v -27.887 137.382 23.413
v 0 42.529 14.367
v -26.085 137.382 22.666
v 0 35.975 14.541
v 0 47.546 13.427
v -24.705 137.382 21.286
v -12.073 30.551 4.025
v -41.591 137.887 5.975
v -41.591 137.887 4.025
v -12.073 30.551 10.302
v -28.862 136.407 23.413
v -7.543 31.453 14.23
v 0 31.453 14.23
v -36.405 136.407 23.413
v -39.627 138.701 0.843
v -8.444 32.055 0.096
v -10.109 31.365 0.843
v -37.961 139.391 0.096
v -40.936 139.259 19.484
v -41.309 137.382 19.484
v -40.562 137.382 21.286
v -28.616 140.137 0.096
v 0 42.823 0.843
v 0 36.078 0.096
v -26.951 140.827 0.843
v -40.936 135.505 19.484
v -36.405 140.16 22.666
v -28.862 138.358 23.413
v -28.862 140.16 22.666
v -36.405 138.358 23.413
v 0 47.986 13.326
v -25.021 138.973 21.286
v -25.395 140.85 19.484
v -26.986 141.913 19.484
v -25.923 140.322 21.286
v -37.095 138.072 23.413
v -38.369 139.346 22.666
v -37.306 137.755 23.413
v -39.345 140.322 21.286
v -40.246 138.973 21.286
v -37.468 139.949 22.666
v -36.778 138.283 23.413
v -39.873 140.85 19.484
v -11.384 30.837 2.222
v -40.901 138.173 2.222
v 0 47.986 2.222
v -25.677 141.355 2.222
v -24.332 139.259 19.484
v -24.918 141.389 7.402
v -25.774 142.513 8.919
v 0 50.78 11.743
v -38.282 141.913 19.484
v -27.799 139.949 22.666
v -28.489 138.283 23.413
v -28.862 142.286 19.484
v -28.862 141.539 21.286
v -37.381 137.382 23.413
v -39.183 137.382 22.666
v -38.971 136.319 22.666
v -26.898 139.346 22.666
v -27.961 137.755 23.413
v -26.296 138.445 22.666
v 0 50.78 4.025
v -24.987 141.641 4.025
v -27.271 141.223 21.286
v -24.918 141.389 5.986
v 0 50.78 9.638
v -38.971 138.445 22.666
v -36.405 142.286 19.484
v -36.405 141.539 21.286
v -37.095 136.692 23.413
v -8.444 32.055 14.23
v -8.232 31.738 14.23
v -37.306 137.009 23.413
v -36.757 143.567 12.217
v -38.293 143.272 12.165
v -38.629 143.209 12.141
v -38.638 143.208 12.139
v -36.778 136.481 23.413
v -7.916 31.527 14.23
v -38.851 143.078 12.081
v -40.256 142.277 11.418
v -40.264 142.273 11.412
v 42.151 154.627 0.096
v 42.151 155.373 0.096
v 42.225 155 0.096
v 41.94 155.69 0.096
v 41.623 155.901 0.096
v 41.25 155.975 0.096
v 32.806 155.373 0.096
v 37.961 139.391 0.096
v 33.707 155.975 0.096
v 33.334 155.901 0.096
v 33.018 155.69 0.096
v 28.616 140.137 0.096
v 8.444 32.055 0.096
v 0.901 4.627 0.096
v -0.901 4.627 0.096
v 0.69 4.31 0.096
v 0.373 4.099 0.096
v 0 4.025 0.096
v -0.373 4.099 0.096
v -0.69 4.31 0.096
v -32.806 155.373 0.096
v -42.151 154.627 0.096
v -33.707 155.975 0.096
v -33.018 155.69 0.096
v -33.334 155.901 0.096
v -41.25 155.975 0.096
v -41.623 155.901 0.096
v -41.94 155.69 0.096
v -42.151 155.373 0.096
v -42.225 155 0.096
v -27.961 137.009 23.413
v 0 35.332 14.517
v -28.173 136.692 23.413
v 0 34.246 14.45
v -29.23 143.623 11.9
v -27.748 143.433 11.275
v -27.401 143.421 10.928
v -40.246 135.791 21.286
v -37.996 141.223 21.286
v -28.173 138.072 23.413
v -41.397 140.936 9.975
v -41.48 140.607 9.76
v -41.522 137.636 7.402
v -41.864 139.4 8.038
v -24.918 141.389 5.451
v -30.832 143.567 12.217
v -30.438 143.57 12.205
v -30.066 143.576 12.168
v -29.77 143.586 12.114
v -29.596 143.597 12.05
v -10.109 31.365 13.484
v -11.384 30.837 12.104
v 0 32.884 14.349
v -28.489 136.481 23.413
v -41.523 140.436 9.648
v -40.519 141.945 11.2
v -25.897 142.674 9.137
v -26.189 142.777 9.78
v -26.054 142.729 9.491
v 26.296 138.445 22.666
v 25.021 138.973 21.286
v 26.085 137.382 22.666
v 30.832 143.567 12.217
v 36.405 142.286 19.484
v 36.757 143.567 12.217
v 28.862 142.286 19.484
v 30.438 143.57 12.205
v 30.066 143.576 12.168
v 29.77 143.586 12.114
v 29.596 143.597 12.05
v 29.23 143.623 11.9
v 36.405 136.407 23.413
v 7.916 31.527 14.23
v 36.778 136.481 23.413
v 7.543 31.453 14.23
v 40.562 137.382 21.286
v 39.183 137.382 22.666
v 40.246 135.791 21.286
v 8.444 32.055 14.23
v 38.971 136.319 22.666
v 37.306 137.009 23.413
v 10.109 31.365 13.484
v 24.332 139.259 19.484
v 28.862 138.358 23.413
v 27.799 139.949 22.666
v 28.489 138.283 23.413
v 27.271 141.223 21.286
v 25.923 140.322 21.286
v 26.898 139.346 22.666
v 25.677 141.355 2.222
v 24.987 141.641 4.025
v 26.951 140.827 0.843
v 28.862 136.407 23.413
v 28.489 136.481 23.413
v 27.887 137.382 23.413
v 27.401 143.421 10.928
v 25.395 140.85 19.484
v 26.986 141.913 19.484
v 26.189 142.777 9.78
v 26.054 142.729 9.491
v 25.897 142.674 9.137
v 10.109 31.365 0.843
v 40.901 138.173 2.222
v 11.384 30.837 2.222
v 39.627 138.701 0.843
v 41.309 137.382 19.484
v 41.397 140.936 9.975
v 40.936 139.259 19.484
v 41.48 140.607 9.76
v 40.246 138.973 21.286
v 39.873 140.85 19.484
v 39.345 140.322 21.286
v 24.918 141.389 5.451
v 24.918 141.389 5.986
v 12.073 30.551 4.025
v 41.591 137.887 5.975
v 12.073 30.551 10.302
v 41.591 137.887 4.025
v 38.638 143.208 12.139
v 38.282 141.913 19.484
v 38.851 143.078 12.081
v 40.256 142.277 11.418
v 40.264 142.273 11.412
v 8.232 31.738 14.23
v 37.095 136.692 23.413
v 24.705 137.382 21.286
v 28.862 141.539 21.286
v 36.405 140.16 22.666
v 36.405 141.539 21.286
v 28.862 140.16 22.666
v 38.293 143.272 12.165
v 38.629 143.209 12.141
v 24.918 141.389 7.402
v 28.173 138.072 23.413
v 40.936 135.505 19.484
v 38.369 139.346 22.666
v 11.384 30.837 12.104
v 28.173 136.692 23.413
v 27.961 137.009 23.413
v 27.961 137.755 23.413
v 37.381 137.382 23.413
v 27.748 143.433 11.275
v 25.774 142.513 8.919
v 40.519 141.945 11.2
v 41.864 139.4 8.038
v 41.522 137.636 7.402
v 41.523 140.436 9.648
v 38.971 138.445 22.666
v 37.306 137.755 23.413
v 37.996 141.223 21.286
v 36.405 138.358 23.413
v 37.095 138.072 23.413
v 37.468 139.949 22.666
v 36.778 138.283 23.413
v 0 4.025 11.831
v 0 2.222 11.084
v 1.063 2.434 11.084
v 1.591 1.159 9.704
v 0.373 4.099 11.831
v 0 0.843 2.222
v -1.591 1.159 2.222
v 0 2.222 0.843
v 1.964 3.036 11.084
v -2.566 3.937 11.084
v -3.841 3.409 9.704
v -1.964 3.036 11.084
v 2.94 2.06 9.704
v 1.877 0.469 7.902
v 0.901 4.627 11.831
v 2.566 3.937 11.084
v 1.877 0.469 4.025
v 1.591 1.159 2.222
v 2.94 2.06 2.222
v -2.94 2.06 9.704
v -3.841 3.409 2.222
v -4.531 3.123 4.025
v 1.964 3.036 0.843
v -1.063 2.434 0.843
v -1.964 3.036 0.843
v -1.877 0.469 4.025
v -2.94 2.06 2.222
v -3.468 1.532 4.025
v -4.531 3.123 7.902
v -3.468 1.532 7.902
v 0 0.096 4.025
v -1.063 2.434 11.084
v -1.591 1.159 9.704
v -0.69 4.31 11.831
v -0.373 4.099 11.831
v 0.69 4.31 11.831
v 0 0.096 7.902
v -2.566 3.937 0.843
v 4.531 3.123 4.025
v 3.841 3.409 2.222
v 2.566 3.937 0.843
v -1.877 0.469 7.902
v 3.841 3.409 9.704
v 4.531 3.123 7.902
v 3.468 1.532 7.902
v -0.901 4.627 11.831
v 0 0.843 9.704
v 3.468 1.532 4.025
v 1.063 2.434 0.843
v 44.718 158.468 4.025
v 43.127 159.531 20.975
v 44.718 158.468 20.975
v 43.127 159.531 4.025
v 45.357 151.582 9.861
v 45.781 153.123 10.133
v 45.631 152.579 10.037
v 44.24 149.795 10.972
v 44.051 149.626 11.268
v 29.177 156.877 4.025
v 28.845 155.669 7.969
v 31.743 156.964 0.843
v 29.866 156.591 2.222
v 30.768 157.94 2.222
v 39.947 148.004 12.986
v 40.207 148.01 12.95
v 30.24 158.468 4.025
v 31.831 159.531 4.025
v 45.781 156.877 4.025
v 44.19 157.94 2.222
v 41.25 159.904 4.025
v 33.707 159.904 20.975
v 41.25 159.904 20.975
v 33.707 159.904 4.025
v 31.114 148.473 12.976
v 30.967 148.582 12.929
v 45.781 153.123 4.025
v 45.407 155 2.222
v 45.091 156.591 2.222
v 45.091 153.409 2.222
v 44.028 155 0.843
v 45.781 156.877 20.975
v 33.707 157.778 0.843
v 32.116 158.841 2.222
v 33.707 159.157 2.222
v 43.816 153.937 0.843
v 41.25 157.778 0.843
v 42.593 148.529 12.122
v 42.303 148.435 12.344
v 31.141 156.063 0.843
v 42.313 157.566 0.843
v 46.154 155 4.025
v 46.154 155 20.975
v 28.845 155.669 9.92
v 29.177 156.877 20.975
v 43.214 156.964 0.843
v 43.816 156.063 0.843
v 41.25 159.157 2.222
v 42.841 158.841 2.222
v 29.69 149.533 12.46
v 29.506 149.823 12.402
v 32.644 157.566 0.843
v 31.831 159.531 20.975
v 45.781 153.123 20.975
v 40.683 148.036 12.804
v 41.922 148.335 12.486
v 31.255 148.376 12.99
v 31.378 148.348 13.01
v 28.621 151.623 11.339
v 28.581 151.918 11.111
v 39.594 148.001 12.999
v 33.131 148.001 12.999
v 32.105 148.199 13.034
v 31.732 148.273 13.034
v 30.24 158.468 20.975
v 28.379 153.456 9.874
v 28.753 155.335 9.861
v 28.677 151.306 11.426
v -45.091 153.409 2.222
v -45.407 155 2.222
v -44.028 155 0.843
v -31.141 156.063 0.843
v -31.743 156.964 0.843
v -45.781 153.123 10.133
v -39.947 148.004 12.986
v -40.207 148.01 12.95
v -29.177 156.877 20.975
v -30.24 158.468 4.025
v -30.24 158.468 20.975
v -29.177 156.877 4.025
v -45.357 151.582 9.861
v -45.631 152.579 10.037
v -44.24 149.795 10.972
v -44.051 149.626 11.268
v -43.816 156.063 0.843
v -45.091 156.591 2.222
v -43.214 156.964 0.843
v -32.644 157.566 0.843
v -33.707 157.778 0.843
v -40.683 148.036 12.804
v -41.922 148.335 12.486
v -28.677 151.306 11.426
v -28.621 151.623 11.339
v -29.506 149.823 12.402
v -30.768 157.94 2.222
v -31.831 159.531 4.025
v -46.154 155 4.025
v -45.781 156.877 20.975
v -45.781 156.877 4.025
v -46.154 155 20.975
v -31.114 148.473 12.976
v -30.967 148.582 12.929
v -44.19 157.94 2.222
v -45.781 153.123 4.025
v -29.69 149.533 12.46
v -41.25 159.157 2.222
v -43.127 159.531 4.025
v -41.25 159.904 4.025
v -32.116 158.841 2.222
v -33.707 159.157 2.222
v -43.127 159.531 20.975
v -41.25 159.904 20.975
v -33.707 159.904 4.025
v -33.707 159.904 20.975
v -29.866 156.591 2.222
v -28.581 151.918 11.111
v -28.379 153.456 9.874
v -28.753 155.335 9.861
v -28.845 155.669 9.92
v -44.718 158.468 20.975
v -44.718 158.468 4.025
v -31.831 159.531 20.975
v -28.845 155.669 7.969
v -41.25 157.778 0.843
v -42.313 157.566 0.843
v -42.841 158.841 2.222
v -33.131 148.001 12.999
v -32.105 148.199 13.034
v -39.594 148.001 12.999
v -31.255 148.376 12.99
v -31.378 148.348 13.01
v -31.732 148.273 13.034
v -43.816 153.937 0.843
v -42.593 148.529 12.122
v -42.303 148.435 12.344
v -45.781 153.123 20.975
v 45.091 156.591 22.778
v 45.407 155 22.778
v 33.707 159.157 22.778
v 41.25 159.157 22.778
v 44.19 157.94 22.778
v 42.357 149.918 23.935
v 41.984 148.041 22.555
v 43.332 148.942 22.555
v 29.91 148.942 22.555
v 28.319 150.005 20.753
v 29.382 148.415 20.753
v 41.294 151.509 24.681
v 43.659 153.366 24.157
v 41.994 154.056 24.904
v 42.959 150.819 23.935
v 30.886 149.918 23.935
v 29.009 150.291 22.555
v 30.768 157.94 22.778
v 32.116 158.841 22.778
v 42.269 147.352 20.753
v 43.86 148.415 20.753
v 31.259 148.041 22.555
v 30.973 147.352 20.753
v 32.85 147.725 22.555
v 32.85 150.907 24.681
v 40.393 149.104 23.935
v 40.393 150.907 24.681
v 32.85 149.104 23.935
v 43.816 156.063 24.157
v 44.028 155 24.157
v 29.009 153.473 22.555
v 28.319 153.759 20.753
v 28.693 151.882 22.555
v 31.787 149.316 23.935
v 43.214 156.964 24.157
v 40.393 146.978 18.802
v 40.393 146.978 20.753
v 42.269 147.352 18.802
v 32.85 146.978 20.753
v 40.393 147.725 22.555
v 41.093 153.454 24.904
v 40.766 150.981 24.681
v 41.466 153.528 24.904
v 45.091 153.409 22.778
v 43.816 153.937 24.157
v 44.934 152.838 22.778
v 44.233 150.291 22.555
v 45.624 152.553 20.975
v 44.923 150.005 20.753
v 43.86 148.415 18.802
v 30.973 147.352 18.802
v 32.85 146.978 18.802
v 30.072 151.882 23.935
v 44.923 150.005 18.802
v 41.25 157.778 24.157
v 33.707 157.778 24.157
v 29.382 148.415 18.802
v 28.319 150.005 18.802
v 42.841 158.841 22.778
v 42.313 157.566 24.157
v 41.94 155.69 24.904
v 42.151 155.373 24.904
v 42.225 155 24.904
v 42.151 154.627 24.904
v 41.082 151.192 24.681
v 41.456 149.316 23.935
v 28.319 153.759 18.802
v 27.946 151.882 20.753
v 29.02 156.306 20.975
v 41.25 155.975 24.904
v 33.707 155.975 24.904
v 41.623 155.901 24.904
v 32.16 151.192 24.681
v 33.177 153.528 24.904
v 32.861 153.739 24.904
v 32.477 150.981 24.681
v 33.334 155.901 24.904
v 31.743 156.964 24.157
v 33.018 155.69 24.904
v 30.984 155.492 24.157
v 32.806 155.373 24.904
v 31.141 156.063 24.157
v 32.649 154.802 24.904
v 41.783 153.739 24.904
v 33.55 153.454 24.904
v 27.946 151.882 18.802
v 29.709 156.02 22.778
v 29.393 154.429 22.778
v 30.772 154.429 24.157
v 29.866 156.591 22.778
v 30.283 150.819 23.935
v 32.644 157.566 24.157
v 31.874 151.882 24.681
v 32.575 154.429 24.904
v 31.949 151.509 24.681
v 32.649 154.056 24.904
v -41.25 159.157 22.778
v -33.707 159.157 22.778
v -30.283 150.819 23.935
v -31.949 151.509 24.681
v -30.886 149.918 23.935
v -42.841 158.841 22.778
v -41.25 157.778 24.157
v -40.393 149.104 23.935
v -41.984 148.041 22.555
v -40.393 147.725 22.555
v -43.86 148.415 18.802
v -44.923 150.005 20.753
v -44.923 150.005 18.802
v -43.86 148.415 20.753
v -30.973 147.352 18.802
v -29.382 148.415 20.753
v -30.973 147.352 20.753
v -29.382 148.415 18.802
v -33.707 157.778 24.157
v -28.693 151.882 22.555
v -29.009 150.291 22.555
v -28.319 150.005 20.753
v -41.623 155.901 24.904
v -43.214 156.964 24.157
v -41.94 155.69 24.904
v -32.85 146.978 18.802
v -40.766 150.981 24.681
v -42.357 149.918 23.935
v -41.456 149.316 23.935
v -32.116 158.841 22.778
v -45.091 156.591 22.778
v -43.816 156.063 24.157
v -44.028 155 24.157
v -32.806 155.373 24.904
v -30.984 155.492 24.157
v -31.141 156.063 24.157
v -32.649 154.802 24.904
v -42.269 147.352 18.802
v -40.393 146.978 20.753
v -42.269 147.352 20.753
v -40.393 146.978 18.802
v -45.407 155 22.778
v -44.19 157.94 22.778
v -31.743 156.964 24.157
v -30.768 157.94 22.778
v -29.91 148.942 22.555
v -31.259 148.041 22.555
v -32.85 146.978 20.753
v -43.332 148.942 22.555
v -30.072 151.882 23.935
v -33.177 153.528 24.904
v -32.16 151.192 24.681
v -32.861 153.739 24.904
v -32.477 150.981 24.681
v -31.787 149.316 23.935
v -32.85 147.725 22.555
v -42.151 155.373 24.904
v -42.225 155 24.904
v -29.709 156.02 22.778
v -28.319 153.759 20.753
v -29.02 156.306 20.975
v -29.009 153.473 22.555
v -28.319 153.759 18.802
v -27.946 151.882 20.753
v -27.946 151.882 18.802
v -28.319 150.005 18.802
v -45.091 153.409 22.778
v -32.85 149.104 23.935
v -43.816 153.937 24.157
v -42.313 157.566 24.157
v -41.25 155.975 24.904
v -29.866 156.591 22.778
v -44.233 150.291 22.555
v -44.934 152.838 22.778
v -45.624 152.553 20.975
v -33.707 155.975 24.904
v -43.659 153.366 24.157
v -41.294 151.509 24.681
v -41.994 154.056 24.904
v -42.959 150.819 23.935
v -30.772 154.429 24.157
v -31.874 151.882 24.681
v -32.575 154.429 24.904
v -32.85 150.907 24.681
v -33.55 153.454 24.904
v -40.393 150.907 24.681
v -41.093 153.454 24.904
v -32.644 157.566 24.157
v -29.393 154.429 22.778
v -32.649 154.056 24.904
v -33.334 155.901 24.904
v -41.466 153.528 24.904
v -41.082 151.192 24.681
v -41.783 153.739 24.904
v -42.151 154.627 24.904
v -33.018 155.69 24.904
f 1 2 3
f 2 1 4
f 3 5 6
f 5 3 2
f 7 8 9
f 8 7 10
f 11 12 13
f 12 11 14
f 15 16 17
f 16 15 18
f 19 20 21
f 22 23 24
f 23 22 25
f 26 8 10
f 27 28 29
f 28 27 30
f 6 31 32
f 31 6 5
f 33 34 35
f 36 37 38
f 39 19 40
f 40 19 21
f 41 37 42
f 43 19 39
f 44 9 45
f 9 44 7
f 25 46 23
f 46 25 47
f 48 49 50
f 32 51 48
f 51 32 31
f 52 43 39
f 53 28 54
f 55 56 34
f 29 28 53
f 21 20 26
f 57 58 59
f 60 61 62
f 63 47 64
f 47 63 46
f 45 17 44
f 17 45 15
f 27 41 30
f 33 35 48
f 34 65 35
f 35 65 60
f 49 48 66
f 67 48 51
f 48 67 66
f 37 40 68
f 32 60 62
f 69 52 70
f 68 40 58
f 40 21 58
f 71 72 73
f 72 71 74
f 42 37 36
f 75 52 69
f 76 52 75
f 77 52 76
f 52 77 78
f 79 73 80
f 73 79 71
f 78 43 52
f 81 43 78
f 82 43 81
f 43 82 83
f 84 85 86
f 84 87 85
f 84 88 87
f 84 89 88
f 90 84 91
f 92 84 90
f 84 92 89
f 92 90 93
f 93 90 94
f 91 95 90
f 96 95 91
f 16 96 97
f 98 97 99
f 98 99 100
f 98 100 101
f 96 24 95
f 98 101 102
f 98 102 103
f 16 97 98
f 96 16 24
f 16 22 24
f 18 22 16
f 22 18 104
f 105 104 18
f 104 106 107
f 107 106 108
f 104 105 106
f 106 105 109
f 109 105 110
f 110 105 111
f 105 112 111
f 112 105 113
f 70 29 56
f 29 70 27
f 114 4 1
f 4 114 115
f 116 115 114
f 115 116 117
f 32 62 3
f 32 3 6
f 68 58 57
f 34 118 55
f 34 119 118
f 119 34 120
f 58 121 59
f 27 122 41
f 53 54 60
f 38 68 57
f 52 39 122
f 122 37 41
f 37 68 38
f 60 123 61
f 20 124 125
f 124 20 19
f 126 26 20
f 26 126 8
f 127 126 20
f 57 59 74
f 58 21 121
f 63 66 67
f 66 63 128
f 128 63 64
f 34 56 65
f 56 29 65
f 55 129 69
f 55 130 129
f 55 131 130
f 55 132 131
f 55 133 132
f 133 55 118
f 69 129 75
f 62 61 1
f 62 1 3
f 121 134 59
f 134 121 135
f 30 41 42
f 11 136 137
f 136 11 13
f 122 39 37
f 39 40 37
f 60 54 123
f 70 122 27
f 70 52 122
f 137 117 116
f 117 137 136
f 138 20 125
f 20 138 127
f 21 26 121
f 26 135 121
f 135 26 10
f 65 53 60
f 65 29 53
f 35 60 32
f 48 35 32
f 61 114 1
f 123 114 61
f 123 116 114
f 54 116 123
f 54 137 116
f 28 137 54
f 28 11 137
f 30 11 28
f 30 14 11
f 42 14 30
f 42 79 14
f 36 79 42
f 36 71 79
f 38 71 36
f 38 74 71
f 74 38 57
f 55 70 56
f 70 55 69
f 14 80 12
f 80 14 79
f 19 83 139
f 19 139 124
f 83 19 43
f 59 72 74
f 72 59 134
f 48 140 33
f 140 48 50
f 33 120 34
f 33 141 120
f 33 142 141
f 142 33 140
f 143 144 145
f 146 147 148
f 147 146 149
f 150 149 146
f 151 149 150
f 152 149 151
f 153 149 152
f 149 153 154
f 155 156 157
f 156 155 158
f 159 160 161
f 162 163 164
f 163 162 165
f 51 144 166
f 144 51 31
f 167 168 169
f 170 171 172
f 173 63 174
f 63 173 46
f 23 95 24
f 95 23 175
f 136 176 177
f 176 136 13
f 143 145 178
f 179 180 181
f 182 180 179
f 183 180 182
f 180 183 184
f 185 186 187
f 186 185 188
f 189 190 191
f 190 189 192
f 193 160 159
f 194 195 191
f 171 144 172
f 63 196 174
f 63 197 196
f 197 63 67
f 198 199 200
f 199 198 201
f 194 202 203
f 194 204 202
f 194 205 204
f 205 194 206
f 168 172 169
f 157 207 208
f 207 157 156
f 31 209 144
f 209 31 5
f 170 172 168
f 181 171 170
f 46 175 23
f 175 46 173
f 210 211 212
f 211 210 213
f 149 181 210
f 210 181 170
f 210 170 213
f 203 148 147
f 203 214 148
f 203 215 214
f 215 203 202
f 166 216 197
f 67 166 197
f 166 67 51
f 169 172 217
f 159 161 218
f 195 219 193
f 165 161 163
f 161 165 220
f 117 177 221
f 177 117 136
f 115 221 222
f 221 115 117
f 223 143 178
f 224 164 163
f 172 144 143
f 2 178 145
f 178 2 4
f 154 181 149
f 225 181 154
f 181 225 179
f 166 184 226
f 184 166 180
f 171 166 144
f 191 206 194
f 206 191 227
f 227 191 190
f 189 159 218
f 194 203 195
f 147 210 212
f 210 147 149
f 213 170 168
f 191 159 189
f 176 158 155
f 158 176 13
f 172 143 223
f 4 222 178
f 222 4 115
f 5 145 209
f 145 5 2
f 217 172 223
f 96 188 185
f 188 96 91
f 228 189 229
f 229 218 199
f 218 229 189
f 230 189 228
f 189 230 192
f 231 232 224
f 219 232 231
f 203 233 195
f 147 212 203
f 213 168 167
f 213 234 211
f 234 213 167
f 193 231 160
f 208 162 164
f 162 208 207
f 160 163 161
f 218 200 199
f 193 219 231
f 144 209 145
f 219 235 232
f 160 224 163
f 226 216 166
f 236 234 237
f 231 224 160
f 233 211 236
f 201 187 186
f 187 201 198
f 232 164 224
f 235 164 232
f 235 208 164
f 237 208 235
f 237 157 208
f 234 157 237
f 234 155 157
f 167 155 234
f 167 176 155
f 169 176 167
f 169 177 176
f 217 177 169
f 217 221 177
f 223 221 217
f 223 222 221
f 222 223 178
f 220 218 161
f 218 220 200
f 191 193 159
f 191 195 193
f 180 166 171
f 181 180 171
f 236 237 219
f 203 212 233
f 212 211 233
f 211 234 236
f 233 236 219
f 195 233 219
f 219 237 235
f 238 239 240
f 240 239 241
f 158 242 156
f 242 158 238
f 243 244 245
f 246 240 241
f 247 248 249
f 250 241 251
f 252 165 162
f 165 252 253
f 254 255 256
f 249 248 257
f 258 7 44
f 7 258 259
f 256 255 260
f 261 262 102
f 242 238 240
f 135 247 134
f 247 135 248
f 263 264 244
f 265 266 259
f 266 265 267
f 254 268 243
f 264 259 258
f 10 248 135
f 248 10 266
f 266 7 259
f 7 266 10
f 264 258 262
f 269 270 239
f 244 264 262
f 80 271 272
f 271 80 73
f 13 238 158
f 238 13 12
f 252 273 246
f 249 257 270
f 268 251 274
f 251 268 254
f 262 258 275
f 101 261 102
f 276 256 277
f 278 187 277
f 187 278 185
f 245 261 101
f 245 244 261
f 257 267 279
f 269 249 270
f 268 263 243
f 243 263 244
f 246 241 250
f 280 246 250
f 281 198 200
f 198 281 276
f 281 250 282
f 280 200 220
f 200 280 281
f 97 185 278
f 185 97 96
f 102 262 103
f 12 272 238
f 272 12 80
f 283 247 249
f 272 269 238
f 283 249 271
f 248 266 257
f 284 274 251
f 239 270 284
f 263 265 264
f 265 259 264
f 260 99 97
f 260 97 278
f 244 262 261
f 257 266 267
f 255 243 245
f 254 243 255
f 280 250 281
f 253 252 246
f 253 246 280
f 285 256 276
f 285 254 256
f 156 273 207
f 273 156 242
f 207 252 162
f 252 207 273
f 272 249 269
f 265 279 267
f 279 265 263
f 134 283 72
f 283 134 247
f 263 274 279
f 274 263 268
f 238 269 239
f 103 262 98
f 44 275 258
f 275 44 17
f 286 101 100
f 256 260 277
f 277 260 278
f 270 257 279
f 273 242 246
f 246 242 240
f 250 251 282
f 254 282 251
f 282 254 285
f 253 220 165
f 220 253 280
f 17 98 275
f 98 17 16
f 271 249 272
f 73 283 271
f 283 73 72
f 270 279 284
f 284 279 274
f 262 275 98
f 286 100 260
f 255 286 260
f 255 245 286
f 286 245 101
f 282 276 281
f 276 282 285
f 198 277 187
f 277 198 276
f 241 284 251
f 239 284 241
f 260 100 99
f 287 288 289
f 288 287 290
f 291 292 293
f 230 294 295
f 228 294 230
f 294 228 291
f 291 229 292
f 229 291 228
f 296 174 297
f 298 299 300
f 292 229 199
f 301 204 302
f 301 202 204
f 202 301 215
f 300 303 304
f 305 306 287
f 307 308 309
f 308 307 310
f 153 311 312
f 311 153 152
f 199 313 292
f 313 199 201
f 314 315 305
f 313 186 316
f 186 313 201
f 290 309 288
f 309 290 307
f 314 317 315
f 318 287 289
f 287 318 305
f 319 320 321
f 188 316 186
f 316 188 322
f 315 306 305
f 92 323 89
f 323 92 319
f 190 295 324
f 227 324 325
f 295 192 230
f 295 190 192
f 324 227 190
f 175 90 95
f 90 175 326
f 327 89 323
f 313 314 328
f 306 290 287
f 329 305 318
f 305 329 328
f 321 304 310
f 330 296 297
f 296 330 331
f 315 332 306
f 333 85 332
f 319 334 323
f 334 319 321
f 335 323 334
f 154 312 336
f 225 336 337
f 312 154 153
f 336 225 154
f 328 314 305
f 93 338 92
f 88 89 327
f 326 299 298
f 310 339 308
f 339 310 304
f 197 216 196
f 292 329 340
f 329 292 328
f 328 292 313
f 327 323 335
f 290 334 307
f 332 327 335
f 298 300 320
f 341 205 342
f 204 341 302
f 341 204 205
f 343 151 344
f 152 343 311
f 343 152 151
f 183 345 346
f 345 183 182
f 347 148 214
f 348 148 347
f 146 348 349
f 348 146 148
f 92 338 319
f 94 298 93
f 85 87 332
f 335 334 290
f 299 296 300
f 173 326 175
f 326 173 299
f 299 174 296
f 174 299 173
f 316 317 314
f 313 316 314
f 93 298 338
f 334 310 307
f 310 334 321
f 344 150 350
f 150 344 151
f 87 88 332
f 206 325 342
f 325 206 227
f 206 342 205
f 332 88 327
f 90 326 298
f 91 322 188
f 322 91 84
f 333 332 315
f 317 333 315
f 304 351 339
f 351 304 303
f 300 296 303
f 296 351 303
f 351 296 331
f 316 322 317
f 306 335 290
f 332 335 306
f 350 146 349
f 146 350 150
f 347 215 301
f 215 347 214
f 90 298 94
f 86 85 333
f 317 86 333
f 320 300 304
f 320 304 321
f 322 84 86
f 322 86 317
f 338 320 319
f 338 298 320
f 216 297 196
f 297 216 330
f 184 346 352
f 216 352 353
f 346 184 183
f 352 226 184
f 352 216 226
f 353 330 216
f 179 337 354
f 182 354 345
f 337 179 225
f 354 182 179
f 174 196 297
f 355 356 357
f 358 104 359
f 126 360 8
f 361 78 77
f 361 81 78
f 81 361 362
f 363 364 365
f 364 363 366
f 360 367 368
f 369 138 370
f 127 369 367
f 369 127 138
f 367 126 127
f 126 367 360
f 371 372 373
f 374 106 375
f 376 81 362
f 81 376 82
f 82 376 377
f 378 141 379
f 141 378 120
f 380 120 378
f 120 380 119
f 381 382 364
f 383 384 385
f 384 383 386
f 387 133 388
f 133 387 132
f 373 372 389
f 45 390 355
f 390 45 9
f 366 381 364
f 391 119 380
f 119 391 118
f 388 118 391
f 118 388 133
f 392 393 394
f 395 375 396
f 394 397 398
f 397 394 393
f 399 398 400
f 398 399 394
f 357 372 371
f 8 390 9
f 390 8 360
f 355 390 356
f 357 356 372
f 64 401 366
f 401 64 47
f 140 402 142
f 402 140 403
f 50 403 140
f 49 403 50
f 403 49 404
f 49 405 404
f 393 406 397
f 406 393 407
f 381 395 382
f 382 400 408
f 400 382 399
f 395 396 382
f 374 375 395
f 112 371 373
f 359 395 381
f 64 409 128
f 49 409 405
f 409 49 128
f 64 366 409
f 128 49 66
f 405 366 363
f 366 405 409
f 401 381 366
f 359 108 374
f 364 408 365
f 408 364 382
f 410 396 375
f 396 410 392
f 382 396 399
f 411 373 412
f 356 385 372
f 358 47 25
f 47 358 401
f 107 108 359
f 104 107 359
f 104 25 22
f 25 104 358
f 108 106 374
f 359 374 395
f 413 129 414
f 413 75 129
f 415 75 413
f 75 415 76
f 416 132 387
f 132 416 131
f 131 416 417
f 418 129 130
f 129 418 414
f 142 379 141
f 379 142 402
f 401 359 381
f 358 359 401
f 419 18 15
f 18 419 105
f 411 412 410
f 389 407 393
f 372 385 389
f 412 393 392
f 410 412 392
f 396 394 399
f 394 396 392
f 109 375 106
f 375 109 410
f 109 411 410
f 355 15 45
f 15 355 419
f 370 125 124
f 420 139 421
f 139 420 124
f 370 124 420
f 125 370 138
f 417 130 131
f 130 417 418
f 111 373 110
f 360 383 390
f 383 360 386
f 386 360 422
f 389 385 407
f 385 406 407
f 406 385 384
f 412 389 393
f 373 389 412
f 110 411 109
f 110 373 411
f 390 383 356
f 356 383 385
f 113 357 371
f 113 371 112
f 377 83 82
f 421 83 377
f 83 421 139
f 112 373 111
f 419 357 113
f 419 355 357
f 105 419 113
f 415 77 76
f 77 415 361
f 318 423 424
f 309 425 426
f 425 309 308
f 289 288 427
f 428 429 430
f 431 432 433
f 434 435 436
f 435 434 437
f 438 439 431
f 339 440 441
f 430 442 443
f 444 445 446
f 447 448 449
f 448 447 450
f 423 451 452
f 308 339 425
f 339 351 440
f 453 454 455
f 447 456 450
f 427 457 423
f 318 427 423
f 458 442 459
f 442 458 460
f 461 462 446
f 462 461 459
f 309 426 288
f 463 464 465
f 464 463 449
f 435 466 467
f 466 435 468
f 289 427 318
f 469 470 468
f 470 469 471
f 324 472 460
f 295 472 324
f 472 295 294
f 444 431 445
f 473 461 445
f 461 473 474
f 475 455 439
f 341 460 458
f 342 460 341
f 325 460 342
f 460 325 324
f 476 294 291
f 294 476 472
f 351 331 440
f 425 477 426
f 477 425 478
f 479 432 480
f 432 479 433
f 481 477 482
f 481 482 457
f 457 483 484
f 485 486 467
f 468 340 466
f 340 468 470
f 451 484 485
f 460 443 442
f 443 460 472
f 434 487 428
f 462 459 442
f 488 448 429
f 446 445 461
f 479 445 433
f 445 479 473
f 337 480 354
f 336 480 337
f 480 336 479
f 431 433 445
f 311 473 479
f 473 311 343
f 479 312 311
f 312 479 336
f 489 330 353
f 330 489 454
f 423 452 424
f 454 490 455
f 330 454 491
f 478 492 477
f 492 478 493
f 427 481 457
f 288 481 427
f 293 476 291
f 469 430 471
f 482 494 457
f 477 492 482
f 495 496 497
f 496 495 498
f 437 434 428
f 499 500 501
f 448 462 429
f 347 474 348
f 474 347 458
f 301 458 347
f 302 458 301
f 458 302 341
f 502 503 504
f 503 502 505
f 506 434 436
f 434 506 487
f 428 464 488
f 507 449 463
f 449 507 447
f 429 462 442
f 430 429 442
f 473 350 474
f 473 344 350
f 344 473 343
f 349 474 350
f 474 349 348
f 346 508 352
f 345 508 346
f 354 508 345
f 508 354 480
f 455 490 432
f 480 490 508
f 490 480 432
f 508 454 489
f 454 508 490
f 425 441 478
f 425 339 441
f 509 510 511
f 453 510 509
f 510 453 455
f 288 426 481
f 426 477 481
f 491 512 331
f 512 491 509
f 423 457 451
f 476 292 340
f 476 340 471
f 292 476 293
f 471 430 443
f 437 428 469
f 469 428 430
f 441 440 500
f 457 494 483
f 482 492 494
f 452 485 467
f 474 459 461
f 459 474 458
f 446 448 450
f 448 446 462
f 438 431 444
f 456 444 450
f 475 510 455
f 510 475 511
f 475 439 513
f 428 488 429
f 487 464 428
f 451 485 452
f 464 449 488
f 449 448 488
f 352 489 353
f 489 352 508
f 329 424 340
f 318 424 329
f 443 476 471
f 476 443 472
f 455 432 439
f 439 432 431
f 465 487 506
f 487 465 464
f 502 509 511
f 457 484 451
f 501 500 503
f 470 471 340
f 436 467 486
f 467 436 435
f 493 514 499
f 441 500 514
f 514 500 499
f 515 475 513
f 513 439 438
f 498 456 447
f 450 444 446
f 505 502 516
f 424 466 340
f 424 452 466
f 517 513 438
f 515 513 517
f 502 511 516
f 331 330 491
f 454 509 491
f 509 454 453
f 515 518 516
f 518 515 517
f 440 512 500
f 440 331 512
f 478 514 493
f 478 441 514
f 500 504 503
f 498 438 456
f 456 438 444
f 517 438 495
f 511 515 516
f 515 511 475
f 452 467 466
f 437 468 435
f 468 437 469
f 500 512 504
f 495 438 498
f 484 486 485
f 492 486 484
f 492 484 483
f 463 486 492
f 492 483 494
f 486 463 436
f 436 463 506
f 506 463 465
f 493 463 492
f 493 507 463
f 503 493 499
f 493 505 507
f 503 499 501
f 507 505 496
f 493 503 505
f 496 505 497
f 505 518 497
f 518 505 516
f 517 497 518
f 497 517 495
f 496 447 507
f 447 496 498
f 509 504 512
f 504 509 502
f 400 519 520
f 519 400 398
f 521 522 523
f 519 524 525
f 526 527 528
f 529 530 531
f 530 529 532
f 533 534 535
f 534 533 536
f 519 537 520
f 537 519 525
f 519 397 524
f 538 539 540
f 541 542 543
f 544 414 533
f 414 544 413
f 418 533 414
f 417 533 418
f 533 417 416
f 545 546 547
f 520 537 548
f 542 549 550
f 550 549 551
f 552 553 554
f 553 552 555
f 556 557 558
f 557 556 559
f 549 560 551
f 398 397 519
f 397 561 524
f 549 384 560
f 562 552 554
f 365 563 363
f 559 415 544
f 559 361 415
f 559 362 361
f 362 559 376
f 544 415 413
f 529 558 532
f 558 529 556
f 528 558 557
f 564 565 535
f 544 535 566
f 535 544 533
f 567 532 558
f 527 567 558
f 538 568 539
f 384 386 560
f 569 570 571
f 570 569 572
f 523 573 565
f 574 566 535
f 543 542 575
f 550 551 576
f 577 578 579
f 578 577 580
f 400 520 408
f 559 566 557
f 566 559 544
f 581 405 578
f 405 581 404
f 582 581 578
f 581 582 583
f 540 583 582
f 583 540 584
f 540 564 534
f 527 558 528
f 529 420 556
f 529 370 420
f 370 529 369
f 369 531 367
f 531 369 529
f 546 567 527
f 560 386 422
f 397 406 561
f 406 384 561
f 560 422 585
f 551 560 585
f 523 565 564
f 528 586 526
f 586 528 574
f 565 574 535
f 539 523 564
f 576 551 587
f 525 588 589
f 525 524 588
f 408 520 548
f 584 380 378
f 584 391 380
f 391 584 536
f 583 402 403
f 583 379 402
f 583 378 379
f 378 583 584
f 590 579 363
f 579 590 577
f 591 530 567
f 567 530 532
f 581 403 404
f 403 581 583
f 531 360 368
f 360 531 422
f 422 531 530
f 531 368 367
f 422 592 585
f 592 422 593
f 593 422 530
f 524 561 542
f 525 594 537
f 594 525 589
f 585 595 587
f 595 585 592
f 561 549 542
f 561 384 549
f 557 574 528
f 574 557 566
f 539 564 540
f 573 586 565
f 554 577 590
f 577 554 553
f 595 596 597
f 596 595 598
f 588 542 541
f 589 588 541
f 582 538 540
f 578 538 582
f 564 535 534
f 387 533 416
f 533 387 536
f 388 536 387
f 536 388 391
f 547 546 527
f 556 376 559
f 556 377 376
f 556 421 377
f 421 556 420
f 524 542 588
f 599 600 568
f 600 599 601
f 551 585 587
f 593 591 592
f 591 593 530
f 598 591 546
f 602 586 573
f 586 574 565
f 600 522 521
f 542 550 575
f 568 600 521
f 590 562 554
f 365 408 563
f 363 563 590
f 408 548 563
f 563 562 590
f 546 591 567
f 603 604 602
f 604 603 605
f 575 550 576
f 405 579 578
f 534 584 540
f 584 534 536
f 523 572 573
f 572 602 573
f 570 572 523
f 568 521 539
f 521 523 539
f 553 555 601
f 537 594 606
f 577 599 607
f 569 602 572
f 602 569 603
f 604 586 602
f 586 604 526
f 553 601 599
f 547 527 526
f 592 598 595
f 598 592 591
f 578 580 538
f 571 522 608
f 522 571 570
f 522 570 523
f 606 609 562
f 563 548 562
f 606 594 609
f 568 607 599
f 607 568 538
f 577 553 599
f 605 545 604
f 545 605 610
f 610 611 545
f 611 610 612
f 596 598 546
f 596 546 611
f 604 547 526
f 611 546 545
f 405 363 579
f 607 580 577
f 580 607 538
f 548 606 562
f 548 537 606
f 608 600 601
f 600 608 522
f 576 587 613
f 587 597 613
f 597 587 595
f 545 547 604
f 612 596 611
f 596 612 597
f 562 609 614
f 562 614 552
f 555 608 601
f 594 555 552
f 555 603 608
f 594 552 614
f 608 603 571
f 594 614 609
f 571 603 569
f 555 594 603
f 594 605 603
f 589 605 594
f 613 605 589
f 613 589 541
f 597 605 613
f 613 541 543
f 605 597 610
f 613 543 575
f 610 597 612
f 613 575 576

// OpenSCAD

/*[Object parameters]*/
//Width
ObjectWidth=280;
//Length
ObjectLenght=400;
//Depth
ObjectH=4.5;

//Displacement of object from the tip of the stand
ObjectLoffset=17;

//Displacement of object from the top of the stand
ObjectHdifference=12;

//Object Tilt (90 is vertical)
ObjectA=100;

ObjectS=[ObjectWidth,ObjectLenght,ObjectH];

/*[Stand Parameters]*/
//Total Length of the stand
VLenght=160;
//Arms width of the stand
VArmWidth=12;
//Maximum Stand Height
VHeight=25;
//Edge smoothing
Smooth=5;
//Select if you want to use angle value or total stand width value
method="width";// [width:Use total stand width,angle:Use V angle]
//Total stand width, only if selected
VWidth=50;
//V angle, only if selected
VAngle=35;

//Declining angle
angleBack=5;

if (method=="width")
        stand(ObjectS,
                ObjectA,
                ObjectHdifference,
                ObjectLoffset,
                fixedDelta(VWidth-VArmWidth,VArmWidth,VLenght),
                angleBack,
                VLenght,
                VArmWidth,
                VHeight,
                Smooth);
if (method=="angle")
       stand(ObjectS,
                ObjectA,
                ObjectHdifference,
                ObjectLoffset,
                VAngle,
                angleBack,
                VLenght,
                VArmWidth,
                VHeight,
                Smooth);

//function to determine the angle so that the V has a fixed size (between midpoints of arms). x= size to set, w = width of arms, l = length of V.
function fixedDelta(x,w,l) = atan((x+w/2)/l);
module stand(ObjectS,ObjectA,ObjectHdifference,ObjectLoffset,angleV,angleBack,length,armW,maxHeight,smooth){
    translate([0,smooth,smooth]){
    minkowski(){
    difference(){
        taperedV(angleV,angleBack,length-smooth*2,armW-smooth*2,maxHeight-smooth*2,smooth);
        translate([0,length-ObjectLoffset,maxHeight-ObjectHdifference-smooth])
        rotate([ObjectA,0,0]) 
            translate([0,ObjectS[1]/2,ObjectS[2]/2])
        cube([ObjectS[0]+2*smooth,ObjectS[1]+2*smooth,ObjectS[2]+2*smooth], center=true);
    }
    sphere(r=smooth);
    }
    %translate([0,length-ObjectLoffset,maxHeight-ObjectHdifference-smooth])
        rotate([ObjectA,0,0]) 
            translate([0,ObjectS[1]/2,ObjectS[2]/2])
        %cube(ObjectS, center=true);
}
}




module v(angle,length, armW){
    width=armW/sin(angle);
polygon([
			[0,0],
			[length*tan(angle),length],
			[length*tan(angle)-width,length],
			[0,width/tan(angle)],
			[-length*tan(angle)+width,length],
			[-length*tan(angle),length]
		]);
}

module taperedV(a1,a2, length, w, maxh){
    difference(){
        linear_extrude(height = maxh)
            v(a1,length,w);
        //translate[]
        cubeS=2*max(length,length*sin(a1)*2);
        translate([0,0,maxh-cubeS/2*sin(a2)])
        rotate([a2,0,0])
        translate([0,0,cubeS/2])
            cube(cubeS, center=true);
    }
    
}
